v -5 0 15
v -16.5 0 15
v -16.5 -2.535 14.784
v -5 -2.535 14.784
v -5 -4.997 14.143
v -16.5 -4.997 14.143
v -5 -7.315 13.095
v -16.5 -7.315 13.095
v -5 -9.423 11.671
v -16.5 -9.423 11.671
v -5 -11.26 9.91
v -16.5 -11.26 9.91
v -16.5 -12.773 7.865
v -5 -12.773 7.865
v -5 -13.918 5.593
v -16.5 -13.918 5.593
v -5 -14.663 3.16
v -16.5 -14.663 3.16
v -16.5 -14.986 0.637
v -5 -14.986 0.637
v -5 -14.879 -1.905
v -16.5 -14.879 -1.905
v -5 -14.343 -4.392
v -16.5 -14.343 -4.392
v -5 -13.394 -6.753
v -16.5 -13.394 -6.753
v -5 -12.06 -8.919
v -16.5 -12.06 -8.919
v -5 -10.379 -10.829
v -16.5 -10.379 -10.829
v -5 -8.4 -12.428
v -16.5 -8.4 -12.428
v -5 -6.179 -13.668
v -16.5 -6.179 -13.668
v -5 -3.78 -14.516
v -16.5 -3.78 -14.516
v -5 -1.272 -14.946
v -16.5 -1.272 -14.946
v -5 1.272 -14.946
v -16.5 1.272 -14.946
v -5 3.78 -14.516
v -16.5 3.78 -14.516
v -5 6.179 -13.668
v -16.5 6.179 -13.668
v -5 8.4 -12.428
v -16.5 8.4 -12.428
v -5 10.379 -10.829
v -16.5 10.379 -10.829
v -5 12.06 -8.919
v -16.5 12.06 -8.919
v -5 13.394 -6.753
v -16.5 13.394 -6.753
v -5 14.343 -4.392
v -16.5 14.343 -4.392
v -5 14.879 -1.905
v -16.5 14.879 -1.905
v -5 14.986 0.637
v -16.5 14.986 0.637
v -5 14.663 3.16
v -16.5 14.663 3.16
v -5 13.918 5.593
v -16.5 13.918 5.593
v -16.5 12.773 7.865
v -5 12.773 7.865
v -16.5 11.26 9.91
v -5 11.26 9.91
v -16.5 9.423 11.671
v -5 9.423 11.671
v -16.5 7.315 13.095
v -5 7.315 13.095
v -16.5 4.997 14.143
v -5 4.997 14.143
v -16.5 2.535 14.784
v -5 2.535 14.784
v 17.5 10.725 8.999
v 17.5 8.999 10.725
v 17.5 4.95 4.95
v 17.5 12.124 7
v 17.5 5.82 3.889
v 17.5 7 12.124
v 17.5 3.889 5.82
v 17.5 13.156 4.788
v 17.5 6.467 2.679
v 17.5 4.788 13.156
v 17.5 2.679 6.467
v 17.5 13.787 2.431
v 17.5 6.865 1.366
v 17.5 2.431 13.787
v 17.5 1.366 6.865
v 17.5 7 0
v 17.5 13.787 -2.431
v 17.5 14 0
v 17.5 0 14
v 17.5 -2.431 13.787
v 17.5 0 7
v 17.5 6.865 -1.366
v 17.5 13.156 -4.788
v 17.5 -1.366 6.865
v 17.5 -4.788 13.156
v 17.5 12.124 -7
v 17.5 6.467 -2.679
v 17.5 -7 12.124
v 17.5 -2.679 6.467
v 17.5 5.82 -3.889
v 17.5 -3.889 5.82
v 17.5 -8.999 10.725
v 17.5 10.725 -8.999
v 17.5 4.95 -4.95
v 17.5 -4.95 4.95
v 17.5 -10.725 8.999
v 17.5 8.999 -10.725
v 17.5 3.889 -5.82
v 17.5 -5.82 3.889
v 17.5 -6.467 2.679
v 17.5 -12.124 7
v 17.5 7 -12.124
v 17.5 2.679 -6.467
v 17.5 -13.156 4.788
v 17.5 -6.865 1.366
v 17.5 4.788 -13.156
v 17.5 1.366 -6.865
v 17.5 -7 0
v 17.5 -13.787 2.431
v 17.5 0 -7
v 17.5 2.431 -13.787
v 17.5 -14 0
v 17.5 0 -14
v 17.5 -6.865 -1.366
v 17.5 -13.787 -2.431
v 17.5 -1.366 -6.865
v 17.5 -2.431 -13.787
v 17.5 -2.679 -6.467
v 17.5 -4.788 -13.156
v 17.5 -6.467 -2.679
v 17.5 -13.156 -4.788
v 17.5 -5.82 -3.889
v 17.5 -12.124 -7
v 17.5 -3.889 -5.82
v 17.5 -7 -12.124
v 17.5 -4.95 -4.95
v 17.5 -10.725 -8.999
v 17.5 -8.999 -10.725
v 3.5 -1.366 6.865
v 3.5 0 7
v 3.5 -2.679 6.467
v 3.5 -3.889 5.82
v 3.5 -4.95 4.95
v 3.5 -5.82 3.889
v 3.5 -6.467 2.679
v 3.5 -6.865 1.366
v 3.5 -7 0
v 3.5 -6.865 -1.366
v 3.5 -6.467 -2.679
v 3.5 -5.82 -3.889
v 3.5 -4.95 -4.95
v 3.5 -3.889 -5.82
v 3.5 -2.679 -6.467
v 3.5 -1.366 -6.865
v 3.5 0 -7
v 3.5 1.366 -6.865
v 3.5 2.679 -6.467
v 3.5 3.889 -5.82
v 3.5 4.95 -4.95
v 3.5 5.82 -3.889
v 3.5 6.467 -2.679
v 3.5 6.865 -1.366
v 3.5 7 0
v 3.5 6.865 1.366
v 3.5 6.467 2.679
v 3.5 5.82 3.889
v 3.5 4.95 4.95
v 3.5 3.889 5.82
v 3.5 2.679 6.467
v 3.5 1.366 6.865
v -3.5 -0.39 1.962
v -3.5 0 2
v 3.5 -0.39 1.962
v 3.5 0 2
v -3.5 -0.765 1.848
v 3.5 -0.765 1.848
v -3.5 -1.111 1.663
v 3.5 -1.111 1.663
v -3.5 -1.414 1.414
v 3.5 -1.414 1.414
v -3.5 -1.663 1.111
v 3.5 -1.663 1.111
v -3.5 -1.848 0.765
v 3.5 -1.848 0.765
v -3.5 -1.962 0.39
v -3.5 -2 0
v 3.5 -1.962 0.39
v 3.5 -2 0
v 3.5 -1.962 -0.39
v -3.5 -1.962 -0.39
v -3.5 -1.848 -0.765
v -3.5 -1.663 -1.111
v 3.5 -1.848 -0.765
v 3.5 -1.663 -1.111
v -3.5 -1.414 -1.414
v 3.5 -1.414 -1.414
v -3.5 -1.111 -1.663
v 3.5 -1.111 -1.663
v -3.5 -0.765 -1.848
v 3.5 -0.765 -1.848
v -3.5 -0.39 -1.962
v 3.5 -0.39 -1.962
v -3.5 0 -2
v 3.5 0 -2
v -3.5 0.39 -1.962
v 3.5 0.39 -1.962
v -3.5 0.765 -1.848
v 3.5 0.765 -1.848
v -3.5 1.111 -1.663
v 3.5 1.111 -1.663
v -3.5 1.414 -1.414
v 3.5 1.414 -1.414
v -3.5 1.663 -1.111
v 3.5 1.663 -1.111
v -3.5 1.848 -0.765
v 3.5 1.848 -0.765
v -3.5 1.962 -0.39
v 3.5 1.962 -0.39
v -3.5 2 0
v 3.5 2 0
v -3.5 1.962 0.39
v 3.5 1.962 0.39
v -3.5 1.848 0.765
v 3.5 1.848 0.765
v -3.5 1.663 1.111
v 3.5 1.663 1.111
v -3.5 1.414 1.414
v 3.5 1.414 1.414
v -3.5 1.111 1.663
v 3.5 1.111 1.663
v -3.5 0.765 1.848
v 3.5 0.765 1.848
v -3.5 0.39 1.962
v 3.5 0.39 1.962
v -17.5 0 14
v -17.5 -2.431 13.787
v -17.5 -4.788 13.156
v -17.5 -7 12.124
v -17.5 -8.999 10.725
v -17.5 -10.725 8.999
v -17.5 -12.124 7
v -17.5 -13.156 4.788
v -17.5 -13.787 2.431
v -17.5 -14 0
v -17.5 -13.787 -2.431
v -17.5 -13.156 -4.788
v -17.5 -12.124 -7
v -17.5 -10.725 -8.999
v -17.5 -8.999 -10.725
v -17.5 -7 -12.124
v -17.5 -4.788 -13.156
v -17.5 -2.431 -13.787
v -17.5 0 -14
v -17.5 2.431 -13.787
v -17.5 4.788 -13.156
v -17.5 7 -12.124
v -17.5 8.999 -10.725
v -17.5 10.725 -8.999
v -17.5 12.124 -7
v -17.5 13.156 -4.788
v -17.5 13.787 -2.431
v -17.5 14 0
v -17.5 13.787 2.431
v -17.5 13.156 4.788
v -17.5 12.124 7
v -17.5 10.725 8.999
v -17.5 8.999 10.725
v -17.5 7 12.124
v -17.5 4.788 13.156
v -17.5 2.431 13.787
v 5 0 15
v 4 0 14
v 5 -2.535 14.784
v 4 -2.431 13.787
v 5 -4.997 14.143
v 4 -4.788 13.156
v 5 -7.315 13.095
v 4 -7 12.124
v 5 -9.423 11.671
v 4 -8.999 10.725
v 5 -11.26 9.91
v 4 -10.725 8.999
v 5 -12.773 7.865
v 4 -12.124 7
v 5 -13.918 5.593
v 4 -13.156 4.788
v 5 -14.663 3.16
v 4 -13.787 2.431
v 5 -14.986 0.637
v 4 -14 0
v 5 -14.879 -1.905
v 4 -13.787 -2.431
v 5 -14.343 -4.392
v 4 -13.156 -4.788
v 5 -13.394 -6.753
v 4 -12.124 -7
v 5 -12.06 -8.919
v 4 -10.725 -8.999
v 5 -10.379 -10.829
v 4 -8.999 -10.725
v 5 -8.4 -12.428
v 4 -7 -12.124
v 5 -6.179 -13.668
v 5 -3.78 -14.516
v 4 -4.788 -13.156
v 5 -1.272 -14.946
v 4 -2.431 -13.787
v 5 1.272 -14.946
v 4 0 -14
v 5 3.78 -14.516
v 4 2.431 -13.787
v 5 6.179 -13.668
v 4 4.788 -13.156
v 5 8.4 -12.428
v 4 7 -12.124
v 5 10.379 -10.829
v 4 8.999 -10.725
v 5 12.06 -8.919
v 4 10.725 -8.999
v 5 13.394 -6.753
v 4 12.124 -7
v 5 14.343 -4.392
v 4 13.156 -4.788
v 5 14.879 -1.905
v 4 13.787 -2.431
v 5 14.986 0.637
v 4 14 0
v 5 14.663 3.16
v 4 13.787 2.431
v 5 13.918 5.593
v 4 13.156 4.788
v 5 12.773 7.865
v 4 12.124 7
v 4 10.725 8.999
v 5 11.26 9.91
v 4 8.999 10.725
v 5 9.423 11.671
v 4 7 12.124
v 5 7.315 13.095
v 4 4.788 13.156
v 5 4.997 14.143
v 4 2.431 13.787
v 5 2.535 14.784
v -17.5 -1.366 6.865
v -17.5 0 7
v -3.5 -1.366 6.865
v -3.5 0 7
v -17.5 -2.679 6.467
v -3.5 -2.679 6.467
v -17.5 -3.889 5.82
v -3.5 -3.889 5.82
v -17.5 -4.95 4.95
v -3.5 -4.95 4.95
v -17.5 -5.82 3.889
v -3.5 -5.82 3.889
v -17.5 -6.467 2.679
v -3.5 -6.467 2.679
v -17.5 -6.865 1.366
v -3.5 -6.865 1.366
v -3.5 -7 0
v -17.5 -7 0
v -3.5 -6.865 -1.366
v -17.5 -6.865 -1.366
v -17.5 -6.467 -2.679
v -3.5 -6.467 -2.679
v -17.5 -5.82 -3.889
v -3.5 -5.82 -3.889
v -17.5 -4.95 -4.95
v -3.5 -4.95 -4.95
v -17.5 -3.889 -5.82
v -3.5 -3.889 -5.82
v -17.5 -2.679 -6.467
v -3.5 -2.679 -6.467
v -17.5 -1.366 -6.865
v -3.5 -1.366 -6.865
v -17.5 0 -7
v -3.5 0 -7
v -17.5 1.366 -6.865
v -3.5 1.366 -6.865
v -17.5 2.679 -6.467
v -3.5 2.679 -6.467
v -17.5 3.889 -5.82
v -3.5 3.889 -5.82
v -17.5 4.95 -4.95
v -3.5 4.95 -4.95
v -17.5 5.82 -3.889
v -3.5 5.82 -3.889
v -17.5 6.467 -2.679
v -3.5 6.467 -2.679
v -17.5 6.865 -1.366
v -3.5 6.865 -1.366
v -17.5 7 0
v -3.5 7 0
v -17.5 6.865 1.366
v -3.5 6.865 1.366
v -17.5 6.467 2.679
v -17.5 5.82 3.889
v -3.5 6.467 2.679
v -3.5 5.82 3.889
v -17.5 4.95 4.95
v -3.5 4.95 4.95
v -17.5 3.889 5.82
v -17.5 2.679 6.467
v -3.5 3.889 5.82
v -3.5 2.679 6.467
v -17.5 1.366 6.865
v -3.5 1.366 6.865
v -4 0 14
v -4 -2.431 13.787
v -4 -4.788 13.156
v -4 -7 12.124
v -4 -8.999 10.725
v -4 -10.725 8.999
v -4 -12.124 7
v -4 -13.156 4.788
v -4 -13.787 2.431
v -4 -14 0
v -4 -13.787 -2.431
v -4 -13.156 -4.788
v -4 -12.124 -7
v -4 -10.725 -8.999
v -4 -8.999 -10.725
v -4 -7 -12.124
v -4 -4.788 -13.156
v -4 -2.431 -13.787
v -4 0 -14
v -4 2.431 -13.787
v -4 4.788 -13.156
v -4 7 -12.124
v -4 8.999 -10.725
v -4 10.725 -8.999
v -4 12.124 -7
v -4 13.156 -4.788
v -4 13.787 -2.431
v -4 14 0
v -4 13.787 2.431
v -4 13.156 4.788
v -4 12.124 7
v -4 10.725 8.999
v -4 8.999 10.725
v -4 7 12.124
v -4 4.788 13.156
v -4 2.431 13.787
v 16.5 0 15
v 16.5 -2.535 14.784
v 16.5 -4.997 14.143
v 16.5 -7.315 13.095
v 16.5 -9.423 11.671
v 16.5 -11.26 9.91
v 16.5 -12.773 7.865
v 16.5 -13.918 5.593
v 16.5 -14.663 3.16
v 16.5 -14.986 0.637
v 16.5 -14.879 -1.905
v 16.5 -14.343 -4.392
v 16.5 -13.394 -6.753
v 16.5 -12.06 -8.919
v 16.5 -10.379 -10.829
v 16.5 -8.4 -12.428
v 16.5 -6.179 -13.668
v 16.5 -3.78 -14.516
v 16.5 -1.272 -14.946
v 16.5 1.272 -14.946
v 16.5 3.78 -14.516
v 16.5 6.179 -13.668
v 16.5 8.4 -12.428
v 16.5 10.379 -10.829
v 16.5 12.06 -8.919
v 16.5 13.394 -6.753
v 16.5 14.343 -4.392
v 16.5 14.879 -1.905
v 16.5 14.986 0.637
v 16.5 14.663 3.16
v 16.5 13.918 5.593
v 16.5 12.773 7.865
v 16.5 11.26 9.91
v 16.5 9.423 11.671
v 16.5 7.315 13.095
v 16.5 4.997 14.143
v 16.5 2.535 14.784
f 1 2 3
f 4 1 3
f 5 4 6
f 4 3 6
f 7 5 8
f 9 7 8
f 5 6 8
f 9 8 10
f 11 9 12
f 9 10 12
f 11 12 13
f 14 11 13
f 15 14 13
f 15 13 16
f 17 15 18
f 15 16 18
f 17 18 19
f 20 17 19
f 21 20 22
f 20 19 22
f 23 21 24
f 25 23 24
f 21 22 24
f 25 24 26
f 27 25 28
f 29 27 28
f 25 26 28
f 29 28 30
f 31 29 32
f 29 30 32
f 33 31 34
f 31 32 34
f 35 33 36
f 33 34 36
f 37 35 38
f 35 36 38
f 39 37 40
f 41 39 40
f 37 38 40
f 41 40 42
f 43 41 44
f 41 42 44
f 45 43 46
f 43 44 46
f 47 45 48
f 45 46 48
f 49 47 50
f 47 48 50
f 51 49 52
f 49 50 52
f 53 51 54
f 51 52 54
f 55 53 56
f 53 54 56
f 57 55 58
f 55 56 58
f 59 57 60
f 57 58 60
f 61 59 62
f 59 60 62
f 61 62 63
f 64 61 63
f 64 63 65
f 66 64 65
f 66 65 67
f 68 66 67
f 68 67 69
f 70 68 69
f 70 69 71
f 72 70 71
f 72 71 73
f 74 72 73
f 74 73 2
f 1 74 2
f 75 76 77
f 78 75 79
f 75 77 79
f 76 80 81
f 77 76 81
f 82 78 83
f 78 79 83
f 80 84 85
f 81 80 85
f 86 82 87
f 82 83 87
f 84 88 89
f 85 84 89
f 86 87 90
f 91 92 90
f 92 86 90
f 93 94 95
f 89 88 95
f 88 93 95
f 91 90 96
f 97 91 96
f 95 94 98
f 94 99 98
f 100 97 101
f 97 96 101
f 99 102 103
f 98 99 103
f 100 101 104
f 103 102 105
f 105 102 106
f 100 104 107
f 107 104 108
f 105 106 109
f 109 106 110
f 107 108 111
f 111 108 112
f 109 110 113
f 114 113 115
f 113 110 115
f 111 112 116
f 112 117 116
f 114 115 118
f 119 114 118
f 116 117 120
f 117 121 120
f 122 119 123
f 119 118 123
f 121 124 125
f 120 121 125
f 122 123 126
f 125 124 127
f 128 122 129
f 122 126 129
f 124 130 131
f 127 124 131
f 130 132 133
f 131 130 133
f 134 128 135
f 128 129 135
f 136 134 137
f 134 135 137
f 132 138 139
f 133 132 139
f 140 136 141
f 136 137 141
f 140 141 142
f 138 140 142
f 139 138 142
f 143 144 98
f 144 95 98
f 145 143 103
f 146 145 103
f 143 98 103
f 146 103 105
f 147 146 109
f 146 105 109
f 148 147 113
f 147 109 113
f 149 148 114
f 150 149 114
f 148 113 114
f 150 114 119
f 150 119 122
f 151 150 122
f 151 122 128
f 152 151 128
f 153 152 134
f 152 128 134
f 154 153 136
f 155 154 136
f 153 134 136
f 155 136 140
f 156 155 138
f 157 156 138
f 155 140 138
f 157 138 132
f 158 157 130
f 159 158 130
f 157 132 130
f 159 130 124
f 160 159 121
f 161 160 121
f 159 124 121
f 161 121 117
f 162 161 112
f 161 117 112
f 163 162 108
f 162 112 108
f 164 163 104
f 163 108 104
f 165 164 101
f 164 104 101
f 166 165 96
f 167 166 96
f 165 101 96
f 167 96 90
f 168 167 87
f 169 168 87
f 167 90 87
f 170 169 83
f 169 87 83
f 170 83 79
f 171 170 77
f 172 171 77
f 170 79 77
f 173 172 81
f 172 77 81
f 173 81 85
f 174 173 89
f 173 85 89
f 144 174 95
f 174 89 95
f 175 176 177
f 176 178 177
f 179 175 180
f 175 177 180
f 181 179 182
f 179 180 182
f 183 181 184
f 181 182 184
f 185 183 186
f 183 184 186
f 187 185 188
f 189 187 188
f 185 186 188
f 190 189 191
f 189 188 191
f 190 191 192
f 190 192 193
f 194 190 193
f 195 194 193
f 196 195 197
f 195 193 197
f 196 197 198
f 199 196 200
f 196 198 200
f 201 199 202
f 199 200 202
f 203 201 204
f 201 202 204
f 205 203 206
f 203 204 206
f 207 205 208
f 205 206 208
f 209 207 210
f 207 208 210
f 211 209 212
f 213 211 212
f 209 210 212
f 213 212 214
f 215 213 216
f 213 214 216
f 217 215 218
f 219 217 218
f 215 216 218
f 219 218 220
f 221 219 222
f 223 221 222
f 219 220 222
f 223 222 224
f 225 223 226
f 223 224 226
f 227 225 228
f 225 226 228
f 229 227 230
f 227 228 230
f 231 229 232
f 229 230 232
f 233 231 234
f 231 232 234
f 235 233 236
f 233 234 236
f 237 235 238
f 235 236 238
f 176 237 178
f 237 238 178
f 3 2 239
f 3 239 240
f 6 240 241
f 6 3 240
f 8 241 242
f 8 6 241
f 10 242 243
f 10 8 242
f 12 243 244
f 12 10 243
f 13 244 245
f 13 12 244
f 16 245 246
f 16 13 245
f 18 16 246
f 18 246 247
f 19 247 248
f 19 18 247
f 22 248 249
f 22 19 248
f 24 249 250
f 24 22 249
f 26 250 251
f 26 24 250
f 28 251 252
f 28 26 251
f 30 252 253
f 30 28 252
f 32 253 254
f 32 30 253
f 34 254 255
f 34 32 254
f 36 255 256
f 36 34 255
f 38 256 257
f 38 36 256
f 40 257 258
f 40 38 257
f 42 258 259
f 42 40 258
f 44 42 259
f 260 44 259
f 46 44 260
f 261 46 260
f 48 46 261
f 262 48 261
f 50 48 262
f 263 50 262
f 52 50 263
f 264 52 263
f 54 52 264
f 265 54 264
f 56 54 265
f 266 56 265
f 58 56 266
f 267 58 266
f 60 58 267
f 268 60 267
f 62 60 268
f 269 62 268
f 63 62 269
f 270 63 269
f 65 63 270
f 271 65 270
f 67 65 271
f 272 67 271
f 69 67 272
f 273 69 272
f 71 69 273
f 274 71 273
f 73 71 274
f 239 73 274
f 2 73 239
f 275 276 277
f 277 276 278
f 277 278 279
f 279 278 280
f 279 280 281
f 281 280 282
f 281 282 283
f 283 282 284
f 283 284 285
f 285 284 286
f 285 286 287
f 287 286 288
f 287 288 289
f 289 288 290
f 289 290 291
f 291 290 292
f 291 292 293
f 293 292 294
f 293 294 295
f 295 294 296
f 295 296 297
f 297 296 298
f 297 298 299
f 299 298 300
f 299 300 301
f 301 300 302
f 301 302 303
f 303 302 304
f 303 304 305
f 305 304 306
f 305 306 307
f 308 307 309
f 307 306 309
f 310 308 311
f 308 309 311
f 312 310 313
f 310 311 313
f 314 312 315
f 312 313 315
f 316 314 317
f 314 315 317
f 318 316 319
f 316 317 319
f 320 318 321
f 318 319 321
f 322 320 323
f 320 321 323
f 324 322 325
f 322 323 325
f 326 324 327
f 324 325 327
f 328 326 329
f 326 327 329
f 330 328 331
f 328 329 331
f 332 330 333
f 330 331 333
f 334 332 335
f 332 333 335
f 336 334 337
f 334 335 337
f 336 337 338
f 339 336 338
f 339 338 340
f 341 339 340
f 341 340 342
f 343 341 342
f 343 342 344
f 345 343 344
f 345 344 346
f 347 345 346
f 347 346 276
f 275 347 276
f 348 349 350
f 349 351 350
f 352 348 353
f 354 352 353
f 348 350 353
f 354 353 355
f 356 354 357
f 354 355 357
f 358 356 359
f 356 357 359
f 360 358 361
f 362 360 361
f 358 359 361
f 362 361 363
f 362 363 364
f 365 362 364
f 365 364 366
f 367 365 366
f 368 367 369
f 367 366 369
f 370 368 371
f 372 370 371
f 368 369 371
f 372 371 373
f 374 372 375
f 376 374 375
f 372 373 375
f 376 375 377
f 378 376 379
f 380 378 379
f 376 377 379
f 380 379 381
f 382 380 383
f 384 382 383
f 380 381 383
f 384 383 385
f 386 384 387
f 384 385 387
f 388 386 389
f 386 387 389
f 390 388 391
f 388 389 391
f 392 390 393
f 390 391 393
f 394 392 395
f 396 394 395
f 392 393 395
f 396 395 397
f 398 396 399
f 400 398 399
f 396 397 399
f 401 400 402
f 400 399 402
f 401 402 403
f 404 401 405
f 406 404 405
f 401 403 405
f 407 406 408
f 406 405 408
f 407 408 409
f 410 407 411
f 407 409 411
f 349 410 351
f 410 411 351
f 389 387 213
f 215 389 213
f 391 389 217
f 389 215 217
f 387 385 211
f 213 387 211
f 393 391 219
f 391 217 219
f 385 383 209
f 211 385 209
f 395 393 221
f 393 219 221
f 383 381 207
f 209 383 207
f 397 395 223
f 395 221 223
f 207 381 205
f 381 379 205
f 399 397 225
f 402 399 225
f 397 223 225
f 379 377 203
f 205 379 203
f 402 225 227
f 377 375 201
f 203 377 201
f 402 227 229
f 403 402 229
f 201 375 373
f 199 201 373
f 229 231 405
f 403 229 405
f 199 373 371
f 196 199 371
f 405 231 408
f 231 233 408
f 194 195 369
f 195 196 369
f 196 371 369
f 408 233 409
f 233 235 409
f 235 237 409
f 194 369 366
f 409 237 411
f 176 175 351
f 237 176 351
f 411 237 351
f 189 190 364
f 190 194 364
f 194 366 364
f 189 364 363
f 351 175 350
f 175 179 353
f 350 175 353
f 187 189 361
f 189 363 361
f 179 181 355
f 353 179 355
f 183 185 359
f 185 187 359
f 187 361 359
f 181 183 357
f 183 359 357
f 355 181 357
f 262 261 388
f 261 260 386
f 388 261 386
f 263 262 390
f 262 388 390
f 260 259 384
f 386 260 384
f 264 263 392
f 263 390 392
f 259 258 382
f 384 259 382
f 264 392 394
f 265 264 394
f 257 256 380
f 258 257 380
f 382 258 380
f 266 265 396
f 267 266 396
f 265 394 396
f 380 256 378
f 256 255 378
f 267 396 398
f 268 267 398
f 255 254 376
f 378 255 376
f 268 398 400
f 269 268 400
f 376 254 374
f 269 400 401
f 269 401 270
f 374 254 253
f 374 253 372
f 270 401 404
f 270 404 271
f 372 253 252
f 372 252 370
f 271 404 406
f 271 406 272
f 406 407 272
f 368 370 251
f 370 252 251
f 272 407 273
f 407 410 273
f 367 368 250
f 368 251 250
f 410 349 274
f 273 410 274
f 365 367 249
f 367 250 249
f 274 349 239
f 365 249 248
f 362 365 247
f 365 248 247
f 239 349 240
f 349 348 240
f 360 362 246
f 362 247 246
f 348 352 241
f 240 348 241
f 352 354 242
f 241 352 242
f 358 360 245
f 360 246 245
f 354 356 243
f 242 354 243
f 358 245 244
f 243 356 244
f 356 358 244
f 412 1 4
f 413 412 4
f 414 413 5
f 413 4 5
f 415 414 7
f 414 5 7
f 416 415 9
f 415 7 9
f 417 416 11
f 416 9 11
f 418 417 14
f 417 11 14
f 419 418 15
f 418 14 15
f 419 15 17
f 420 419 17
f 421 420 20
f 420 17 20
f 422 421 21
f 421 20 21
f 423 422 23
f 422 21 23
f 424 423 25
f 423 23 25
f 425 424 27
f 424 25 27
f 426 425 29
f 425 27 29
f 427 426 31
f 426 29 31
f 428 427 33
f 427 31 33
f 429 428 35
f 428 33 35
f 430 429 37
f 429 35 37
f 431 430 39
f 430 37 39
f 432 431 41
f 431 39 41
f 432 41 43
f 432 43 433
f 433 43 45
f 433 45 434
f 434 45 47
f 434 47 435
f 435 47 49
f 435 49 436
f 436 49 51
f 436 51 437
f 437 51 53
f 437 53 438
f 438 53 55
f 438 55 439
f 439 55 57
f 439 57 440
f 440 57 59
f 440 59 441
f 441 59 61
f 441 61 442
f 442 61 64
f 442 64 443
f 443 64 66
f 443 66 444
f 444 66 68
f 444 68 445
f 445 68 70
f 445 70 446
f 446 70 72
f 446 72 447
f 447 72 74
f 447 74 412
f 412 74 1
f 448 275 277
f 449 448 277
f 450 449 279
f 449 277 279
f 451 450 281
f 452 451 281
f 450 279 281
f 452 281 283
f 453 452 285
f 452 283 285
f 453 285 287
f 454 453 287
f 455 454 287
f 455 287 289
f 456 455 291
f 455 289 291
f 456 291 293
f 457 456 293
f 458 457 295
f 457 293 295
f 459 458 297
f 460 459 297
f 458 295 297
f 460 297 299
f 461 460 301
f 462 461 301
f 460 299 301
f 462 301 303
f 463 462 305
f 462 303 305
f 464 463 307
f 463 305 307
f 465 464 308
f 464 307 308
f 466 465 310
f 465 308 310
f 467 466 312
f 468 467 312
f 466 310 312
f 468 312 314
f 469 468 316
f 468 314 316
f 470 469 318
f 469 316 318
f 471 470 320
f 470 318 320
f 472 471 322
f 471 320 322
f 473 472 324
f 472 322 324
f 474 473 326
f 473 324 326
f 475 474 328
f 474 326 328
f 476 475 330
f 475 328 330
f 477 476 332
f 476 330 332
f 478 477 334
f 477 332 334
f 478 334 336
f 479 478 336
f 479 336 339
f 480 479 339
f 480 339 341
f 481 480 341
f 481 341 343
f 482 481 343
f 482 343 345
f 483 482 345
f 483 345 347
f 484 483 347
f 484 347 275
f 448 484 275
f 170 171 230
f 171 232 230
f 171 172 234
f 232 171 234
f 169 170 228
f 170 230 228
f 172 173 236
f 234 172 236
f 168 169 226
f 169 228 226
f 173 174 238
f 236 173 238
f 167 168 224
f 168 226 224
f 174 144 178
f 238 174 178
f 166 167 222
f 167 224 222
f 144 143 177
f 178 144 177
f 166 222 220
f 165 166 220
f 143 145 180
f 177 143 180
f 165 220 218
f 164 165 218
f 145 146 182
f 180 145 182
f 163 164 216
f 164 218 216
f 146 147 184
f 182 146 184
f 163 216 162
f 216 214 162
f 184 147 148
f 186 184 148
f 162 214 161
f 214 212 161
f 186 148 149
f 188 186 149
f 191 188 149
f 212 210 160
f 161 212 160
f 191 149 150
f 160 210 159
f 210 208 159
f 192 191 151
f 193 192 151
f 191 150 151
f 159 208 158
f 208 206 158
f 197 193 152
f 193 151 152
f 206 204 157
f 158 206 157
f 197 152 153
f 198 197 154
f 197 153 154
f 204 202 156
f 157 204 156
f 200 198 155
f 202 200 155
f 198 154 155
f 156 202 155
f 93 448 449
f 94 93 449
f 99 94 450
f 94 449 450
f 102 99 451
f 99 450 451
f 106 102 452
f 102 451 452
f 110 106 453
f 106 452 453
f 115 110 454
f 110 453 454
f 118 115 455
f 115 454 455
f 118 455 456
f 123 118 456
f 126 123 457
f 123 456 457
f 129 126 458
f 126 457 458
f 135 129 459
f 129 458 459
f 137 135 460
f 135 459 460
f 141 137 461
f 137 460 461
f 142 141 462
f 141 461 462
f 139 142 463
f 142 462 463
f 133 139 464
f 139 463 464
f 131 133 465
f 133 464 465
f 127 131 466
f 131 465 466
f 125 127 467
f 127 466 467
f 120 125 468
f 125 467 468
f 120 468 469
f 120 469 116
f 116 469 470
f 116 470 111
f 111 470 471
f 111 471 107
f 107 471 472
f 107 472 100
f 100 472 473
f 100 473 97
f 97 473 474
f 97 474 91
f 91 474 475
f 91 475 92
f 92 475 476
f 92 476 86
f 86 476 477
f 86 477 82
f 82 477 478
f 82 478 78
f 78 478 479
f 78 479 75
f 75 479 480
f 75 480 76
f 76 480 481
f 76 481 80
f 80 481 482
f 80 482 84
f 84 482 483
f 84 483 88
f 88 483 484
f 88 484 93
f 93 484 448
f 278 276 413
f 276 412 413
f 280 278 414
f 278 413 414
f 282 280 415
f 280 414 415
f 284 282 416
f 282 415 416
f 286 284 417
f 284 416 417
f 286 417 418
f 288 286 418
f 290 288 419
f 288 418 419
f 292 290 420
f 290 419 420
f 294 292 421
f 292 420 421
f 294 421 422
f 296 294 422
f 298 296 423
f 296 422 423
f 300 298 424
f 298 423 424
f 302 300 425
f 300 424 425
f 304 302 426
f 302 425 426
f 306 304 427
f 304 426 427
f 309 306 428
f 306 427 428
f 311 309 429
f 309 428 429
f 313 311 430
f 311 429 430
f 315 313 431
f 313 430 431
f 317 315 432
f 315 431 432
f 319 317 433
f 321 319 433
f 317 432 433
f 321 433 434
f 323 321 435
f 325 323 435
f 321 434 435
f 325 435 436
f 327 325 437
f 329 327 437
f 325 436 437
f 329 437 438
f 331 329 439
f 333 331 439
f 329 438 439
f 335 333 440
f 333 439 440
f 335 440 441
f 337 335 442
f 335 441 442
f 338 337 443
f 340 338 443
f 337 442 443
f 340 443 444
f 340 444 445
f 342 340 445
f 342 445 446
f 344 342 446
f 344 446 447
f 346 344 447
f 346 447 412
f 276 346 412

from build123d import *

# Parameters (mm, degrees)
SFAZOWANIE1_SIZE = 1


with BuildPart() as part:
    # Szkic1 → Obrót1 (revolve)
    with BuildSketch(Plane.XY, mode=Mode.PRIVATE) as obr_t1_sk:
        Polygon((-17.5, 15), (-17.5, 7), (-3.5, 7), (-3.5, 2), (3.5, 2), (3.5, 7), (17.5, 7), (17.5, 15), (4, 15), (4, 14), (-4, 14), (-4, 15), align=None)
    revolve(obr_t1_sk.sketch.rotate(Axis((0, 0, 0), (1, 0, 0)), 90), axis=Axis((0, 0, 0), (1, 0, 0)))

    # Sfazowanie1
    sfazowanie1_edges = [part.edges().sort_by_distance(p)[0] for p in [
        (4, 0, -15),
        (17.5, 0, -15),
        (-17.5, 0, -15),
        (-4, 0, -15),
    ]]
    chamfer(sfazowanie1_edges, length=SFAZOWANIE1_SIZE - 0.0001)  # a hair under: the kernel refuses the full size


solid = part.part
